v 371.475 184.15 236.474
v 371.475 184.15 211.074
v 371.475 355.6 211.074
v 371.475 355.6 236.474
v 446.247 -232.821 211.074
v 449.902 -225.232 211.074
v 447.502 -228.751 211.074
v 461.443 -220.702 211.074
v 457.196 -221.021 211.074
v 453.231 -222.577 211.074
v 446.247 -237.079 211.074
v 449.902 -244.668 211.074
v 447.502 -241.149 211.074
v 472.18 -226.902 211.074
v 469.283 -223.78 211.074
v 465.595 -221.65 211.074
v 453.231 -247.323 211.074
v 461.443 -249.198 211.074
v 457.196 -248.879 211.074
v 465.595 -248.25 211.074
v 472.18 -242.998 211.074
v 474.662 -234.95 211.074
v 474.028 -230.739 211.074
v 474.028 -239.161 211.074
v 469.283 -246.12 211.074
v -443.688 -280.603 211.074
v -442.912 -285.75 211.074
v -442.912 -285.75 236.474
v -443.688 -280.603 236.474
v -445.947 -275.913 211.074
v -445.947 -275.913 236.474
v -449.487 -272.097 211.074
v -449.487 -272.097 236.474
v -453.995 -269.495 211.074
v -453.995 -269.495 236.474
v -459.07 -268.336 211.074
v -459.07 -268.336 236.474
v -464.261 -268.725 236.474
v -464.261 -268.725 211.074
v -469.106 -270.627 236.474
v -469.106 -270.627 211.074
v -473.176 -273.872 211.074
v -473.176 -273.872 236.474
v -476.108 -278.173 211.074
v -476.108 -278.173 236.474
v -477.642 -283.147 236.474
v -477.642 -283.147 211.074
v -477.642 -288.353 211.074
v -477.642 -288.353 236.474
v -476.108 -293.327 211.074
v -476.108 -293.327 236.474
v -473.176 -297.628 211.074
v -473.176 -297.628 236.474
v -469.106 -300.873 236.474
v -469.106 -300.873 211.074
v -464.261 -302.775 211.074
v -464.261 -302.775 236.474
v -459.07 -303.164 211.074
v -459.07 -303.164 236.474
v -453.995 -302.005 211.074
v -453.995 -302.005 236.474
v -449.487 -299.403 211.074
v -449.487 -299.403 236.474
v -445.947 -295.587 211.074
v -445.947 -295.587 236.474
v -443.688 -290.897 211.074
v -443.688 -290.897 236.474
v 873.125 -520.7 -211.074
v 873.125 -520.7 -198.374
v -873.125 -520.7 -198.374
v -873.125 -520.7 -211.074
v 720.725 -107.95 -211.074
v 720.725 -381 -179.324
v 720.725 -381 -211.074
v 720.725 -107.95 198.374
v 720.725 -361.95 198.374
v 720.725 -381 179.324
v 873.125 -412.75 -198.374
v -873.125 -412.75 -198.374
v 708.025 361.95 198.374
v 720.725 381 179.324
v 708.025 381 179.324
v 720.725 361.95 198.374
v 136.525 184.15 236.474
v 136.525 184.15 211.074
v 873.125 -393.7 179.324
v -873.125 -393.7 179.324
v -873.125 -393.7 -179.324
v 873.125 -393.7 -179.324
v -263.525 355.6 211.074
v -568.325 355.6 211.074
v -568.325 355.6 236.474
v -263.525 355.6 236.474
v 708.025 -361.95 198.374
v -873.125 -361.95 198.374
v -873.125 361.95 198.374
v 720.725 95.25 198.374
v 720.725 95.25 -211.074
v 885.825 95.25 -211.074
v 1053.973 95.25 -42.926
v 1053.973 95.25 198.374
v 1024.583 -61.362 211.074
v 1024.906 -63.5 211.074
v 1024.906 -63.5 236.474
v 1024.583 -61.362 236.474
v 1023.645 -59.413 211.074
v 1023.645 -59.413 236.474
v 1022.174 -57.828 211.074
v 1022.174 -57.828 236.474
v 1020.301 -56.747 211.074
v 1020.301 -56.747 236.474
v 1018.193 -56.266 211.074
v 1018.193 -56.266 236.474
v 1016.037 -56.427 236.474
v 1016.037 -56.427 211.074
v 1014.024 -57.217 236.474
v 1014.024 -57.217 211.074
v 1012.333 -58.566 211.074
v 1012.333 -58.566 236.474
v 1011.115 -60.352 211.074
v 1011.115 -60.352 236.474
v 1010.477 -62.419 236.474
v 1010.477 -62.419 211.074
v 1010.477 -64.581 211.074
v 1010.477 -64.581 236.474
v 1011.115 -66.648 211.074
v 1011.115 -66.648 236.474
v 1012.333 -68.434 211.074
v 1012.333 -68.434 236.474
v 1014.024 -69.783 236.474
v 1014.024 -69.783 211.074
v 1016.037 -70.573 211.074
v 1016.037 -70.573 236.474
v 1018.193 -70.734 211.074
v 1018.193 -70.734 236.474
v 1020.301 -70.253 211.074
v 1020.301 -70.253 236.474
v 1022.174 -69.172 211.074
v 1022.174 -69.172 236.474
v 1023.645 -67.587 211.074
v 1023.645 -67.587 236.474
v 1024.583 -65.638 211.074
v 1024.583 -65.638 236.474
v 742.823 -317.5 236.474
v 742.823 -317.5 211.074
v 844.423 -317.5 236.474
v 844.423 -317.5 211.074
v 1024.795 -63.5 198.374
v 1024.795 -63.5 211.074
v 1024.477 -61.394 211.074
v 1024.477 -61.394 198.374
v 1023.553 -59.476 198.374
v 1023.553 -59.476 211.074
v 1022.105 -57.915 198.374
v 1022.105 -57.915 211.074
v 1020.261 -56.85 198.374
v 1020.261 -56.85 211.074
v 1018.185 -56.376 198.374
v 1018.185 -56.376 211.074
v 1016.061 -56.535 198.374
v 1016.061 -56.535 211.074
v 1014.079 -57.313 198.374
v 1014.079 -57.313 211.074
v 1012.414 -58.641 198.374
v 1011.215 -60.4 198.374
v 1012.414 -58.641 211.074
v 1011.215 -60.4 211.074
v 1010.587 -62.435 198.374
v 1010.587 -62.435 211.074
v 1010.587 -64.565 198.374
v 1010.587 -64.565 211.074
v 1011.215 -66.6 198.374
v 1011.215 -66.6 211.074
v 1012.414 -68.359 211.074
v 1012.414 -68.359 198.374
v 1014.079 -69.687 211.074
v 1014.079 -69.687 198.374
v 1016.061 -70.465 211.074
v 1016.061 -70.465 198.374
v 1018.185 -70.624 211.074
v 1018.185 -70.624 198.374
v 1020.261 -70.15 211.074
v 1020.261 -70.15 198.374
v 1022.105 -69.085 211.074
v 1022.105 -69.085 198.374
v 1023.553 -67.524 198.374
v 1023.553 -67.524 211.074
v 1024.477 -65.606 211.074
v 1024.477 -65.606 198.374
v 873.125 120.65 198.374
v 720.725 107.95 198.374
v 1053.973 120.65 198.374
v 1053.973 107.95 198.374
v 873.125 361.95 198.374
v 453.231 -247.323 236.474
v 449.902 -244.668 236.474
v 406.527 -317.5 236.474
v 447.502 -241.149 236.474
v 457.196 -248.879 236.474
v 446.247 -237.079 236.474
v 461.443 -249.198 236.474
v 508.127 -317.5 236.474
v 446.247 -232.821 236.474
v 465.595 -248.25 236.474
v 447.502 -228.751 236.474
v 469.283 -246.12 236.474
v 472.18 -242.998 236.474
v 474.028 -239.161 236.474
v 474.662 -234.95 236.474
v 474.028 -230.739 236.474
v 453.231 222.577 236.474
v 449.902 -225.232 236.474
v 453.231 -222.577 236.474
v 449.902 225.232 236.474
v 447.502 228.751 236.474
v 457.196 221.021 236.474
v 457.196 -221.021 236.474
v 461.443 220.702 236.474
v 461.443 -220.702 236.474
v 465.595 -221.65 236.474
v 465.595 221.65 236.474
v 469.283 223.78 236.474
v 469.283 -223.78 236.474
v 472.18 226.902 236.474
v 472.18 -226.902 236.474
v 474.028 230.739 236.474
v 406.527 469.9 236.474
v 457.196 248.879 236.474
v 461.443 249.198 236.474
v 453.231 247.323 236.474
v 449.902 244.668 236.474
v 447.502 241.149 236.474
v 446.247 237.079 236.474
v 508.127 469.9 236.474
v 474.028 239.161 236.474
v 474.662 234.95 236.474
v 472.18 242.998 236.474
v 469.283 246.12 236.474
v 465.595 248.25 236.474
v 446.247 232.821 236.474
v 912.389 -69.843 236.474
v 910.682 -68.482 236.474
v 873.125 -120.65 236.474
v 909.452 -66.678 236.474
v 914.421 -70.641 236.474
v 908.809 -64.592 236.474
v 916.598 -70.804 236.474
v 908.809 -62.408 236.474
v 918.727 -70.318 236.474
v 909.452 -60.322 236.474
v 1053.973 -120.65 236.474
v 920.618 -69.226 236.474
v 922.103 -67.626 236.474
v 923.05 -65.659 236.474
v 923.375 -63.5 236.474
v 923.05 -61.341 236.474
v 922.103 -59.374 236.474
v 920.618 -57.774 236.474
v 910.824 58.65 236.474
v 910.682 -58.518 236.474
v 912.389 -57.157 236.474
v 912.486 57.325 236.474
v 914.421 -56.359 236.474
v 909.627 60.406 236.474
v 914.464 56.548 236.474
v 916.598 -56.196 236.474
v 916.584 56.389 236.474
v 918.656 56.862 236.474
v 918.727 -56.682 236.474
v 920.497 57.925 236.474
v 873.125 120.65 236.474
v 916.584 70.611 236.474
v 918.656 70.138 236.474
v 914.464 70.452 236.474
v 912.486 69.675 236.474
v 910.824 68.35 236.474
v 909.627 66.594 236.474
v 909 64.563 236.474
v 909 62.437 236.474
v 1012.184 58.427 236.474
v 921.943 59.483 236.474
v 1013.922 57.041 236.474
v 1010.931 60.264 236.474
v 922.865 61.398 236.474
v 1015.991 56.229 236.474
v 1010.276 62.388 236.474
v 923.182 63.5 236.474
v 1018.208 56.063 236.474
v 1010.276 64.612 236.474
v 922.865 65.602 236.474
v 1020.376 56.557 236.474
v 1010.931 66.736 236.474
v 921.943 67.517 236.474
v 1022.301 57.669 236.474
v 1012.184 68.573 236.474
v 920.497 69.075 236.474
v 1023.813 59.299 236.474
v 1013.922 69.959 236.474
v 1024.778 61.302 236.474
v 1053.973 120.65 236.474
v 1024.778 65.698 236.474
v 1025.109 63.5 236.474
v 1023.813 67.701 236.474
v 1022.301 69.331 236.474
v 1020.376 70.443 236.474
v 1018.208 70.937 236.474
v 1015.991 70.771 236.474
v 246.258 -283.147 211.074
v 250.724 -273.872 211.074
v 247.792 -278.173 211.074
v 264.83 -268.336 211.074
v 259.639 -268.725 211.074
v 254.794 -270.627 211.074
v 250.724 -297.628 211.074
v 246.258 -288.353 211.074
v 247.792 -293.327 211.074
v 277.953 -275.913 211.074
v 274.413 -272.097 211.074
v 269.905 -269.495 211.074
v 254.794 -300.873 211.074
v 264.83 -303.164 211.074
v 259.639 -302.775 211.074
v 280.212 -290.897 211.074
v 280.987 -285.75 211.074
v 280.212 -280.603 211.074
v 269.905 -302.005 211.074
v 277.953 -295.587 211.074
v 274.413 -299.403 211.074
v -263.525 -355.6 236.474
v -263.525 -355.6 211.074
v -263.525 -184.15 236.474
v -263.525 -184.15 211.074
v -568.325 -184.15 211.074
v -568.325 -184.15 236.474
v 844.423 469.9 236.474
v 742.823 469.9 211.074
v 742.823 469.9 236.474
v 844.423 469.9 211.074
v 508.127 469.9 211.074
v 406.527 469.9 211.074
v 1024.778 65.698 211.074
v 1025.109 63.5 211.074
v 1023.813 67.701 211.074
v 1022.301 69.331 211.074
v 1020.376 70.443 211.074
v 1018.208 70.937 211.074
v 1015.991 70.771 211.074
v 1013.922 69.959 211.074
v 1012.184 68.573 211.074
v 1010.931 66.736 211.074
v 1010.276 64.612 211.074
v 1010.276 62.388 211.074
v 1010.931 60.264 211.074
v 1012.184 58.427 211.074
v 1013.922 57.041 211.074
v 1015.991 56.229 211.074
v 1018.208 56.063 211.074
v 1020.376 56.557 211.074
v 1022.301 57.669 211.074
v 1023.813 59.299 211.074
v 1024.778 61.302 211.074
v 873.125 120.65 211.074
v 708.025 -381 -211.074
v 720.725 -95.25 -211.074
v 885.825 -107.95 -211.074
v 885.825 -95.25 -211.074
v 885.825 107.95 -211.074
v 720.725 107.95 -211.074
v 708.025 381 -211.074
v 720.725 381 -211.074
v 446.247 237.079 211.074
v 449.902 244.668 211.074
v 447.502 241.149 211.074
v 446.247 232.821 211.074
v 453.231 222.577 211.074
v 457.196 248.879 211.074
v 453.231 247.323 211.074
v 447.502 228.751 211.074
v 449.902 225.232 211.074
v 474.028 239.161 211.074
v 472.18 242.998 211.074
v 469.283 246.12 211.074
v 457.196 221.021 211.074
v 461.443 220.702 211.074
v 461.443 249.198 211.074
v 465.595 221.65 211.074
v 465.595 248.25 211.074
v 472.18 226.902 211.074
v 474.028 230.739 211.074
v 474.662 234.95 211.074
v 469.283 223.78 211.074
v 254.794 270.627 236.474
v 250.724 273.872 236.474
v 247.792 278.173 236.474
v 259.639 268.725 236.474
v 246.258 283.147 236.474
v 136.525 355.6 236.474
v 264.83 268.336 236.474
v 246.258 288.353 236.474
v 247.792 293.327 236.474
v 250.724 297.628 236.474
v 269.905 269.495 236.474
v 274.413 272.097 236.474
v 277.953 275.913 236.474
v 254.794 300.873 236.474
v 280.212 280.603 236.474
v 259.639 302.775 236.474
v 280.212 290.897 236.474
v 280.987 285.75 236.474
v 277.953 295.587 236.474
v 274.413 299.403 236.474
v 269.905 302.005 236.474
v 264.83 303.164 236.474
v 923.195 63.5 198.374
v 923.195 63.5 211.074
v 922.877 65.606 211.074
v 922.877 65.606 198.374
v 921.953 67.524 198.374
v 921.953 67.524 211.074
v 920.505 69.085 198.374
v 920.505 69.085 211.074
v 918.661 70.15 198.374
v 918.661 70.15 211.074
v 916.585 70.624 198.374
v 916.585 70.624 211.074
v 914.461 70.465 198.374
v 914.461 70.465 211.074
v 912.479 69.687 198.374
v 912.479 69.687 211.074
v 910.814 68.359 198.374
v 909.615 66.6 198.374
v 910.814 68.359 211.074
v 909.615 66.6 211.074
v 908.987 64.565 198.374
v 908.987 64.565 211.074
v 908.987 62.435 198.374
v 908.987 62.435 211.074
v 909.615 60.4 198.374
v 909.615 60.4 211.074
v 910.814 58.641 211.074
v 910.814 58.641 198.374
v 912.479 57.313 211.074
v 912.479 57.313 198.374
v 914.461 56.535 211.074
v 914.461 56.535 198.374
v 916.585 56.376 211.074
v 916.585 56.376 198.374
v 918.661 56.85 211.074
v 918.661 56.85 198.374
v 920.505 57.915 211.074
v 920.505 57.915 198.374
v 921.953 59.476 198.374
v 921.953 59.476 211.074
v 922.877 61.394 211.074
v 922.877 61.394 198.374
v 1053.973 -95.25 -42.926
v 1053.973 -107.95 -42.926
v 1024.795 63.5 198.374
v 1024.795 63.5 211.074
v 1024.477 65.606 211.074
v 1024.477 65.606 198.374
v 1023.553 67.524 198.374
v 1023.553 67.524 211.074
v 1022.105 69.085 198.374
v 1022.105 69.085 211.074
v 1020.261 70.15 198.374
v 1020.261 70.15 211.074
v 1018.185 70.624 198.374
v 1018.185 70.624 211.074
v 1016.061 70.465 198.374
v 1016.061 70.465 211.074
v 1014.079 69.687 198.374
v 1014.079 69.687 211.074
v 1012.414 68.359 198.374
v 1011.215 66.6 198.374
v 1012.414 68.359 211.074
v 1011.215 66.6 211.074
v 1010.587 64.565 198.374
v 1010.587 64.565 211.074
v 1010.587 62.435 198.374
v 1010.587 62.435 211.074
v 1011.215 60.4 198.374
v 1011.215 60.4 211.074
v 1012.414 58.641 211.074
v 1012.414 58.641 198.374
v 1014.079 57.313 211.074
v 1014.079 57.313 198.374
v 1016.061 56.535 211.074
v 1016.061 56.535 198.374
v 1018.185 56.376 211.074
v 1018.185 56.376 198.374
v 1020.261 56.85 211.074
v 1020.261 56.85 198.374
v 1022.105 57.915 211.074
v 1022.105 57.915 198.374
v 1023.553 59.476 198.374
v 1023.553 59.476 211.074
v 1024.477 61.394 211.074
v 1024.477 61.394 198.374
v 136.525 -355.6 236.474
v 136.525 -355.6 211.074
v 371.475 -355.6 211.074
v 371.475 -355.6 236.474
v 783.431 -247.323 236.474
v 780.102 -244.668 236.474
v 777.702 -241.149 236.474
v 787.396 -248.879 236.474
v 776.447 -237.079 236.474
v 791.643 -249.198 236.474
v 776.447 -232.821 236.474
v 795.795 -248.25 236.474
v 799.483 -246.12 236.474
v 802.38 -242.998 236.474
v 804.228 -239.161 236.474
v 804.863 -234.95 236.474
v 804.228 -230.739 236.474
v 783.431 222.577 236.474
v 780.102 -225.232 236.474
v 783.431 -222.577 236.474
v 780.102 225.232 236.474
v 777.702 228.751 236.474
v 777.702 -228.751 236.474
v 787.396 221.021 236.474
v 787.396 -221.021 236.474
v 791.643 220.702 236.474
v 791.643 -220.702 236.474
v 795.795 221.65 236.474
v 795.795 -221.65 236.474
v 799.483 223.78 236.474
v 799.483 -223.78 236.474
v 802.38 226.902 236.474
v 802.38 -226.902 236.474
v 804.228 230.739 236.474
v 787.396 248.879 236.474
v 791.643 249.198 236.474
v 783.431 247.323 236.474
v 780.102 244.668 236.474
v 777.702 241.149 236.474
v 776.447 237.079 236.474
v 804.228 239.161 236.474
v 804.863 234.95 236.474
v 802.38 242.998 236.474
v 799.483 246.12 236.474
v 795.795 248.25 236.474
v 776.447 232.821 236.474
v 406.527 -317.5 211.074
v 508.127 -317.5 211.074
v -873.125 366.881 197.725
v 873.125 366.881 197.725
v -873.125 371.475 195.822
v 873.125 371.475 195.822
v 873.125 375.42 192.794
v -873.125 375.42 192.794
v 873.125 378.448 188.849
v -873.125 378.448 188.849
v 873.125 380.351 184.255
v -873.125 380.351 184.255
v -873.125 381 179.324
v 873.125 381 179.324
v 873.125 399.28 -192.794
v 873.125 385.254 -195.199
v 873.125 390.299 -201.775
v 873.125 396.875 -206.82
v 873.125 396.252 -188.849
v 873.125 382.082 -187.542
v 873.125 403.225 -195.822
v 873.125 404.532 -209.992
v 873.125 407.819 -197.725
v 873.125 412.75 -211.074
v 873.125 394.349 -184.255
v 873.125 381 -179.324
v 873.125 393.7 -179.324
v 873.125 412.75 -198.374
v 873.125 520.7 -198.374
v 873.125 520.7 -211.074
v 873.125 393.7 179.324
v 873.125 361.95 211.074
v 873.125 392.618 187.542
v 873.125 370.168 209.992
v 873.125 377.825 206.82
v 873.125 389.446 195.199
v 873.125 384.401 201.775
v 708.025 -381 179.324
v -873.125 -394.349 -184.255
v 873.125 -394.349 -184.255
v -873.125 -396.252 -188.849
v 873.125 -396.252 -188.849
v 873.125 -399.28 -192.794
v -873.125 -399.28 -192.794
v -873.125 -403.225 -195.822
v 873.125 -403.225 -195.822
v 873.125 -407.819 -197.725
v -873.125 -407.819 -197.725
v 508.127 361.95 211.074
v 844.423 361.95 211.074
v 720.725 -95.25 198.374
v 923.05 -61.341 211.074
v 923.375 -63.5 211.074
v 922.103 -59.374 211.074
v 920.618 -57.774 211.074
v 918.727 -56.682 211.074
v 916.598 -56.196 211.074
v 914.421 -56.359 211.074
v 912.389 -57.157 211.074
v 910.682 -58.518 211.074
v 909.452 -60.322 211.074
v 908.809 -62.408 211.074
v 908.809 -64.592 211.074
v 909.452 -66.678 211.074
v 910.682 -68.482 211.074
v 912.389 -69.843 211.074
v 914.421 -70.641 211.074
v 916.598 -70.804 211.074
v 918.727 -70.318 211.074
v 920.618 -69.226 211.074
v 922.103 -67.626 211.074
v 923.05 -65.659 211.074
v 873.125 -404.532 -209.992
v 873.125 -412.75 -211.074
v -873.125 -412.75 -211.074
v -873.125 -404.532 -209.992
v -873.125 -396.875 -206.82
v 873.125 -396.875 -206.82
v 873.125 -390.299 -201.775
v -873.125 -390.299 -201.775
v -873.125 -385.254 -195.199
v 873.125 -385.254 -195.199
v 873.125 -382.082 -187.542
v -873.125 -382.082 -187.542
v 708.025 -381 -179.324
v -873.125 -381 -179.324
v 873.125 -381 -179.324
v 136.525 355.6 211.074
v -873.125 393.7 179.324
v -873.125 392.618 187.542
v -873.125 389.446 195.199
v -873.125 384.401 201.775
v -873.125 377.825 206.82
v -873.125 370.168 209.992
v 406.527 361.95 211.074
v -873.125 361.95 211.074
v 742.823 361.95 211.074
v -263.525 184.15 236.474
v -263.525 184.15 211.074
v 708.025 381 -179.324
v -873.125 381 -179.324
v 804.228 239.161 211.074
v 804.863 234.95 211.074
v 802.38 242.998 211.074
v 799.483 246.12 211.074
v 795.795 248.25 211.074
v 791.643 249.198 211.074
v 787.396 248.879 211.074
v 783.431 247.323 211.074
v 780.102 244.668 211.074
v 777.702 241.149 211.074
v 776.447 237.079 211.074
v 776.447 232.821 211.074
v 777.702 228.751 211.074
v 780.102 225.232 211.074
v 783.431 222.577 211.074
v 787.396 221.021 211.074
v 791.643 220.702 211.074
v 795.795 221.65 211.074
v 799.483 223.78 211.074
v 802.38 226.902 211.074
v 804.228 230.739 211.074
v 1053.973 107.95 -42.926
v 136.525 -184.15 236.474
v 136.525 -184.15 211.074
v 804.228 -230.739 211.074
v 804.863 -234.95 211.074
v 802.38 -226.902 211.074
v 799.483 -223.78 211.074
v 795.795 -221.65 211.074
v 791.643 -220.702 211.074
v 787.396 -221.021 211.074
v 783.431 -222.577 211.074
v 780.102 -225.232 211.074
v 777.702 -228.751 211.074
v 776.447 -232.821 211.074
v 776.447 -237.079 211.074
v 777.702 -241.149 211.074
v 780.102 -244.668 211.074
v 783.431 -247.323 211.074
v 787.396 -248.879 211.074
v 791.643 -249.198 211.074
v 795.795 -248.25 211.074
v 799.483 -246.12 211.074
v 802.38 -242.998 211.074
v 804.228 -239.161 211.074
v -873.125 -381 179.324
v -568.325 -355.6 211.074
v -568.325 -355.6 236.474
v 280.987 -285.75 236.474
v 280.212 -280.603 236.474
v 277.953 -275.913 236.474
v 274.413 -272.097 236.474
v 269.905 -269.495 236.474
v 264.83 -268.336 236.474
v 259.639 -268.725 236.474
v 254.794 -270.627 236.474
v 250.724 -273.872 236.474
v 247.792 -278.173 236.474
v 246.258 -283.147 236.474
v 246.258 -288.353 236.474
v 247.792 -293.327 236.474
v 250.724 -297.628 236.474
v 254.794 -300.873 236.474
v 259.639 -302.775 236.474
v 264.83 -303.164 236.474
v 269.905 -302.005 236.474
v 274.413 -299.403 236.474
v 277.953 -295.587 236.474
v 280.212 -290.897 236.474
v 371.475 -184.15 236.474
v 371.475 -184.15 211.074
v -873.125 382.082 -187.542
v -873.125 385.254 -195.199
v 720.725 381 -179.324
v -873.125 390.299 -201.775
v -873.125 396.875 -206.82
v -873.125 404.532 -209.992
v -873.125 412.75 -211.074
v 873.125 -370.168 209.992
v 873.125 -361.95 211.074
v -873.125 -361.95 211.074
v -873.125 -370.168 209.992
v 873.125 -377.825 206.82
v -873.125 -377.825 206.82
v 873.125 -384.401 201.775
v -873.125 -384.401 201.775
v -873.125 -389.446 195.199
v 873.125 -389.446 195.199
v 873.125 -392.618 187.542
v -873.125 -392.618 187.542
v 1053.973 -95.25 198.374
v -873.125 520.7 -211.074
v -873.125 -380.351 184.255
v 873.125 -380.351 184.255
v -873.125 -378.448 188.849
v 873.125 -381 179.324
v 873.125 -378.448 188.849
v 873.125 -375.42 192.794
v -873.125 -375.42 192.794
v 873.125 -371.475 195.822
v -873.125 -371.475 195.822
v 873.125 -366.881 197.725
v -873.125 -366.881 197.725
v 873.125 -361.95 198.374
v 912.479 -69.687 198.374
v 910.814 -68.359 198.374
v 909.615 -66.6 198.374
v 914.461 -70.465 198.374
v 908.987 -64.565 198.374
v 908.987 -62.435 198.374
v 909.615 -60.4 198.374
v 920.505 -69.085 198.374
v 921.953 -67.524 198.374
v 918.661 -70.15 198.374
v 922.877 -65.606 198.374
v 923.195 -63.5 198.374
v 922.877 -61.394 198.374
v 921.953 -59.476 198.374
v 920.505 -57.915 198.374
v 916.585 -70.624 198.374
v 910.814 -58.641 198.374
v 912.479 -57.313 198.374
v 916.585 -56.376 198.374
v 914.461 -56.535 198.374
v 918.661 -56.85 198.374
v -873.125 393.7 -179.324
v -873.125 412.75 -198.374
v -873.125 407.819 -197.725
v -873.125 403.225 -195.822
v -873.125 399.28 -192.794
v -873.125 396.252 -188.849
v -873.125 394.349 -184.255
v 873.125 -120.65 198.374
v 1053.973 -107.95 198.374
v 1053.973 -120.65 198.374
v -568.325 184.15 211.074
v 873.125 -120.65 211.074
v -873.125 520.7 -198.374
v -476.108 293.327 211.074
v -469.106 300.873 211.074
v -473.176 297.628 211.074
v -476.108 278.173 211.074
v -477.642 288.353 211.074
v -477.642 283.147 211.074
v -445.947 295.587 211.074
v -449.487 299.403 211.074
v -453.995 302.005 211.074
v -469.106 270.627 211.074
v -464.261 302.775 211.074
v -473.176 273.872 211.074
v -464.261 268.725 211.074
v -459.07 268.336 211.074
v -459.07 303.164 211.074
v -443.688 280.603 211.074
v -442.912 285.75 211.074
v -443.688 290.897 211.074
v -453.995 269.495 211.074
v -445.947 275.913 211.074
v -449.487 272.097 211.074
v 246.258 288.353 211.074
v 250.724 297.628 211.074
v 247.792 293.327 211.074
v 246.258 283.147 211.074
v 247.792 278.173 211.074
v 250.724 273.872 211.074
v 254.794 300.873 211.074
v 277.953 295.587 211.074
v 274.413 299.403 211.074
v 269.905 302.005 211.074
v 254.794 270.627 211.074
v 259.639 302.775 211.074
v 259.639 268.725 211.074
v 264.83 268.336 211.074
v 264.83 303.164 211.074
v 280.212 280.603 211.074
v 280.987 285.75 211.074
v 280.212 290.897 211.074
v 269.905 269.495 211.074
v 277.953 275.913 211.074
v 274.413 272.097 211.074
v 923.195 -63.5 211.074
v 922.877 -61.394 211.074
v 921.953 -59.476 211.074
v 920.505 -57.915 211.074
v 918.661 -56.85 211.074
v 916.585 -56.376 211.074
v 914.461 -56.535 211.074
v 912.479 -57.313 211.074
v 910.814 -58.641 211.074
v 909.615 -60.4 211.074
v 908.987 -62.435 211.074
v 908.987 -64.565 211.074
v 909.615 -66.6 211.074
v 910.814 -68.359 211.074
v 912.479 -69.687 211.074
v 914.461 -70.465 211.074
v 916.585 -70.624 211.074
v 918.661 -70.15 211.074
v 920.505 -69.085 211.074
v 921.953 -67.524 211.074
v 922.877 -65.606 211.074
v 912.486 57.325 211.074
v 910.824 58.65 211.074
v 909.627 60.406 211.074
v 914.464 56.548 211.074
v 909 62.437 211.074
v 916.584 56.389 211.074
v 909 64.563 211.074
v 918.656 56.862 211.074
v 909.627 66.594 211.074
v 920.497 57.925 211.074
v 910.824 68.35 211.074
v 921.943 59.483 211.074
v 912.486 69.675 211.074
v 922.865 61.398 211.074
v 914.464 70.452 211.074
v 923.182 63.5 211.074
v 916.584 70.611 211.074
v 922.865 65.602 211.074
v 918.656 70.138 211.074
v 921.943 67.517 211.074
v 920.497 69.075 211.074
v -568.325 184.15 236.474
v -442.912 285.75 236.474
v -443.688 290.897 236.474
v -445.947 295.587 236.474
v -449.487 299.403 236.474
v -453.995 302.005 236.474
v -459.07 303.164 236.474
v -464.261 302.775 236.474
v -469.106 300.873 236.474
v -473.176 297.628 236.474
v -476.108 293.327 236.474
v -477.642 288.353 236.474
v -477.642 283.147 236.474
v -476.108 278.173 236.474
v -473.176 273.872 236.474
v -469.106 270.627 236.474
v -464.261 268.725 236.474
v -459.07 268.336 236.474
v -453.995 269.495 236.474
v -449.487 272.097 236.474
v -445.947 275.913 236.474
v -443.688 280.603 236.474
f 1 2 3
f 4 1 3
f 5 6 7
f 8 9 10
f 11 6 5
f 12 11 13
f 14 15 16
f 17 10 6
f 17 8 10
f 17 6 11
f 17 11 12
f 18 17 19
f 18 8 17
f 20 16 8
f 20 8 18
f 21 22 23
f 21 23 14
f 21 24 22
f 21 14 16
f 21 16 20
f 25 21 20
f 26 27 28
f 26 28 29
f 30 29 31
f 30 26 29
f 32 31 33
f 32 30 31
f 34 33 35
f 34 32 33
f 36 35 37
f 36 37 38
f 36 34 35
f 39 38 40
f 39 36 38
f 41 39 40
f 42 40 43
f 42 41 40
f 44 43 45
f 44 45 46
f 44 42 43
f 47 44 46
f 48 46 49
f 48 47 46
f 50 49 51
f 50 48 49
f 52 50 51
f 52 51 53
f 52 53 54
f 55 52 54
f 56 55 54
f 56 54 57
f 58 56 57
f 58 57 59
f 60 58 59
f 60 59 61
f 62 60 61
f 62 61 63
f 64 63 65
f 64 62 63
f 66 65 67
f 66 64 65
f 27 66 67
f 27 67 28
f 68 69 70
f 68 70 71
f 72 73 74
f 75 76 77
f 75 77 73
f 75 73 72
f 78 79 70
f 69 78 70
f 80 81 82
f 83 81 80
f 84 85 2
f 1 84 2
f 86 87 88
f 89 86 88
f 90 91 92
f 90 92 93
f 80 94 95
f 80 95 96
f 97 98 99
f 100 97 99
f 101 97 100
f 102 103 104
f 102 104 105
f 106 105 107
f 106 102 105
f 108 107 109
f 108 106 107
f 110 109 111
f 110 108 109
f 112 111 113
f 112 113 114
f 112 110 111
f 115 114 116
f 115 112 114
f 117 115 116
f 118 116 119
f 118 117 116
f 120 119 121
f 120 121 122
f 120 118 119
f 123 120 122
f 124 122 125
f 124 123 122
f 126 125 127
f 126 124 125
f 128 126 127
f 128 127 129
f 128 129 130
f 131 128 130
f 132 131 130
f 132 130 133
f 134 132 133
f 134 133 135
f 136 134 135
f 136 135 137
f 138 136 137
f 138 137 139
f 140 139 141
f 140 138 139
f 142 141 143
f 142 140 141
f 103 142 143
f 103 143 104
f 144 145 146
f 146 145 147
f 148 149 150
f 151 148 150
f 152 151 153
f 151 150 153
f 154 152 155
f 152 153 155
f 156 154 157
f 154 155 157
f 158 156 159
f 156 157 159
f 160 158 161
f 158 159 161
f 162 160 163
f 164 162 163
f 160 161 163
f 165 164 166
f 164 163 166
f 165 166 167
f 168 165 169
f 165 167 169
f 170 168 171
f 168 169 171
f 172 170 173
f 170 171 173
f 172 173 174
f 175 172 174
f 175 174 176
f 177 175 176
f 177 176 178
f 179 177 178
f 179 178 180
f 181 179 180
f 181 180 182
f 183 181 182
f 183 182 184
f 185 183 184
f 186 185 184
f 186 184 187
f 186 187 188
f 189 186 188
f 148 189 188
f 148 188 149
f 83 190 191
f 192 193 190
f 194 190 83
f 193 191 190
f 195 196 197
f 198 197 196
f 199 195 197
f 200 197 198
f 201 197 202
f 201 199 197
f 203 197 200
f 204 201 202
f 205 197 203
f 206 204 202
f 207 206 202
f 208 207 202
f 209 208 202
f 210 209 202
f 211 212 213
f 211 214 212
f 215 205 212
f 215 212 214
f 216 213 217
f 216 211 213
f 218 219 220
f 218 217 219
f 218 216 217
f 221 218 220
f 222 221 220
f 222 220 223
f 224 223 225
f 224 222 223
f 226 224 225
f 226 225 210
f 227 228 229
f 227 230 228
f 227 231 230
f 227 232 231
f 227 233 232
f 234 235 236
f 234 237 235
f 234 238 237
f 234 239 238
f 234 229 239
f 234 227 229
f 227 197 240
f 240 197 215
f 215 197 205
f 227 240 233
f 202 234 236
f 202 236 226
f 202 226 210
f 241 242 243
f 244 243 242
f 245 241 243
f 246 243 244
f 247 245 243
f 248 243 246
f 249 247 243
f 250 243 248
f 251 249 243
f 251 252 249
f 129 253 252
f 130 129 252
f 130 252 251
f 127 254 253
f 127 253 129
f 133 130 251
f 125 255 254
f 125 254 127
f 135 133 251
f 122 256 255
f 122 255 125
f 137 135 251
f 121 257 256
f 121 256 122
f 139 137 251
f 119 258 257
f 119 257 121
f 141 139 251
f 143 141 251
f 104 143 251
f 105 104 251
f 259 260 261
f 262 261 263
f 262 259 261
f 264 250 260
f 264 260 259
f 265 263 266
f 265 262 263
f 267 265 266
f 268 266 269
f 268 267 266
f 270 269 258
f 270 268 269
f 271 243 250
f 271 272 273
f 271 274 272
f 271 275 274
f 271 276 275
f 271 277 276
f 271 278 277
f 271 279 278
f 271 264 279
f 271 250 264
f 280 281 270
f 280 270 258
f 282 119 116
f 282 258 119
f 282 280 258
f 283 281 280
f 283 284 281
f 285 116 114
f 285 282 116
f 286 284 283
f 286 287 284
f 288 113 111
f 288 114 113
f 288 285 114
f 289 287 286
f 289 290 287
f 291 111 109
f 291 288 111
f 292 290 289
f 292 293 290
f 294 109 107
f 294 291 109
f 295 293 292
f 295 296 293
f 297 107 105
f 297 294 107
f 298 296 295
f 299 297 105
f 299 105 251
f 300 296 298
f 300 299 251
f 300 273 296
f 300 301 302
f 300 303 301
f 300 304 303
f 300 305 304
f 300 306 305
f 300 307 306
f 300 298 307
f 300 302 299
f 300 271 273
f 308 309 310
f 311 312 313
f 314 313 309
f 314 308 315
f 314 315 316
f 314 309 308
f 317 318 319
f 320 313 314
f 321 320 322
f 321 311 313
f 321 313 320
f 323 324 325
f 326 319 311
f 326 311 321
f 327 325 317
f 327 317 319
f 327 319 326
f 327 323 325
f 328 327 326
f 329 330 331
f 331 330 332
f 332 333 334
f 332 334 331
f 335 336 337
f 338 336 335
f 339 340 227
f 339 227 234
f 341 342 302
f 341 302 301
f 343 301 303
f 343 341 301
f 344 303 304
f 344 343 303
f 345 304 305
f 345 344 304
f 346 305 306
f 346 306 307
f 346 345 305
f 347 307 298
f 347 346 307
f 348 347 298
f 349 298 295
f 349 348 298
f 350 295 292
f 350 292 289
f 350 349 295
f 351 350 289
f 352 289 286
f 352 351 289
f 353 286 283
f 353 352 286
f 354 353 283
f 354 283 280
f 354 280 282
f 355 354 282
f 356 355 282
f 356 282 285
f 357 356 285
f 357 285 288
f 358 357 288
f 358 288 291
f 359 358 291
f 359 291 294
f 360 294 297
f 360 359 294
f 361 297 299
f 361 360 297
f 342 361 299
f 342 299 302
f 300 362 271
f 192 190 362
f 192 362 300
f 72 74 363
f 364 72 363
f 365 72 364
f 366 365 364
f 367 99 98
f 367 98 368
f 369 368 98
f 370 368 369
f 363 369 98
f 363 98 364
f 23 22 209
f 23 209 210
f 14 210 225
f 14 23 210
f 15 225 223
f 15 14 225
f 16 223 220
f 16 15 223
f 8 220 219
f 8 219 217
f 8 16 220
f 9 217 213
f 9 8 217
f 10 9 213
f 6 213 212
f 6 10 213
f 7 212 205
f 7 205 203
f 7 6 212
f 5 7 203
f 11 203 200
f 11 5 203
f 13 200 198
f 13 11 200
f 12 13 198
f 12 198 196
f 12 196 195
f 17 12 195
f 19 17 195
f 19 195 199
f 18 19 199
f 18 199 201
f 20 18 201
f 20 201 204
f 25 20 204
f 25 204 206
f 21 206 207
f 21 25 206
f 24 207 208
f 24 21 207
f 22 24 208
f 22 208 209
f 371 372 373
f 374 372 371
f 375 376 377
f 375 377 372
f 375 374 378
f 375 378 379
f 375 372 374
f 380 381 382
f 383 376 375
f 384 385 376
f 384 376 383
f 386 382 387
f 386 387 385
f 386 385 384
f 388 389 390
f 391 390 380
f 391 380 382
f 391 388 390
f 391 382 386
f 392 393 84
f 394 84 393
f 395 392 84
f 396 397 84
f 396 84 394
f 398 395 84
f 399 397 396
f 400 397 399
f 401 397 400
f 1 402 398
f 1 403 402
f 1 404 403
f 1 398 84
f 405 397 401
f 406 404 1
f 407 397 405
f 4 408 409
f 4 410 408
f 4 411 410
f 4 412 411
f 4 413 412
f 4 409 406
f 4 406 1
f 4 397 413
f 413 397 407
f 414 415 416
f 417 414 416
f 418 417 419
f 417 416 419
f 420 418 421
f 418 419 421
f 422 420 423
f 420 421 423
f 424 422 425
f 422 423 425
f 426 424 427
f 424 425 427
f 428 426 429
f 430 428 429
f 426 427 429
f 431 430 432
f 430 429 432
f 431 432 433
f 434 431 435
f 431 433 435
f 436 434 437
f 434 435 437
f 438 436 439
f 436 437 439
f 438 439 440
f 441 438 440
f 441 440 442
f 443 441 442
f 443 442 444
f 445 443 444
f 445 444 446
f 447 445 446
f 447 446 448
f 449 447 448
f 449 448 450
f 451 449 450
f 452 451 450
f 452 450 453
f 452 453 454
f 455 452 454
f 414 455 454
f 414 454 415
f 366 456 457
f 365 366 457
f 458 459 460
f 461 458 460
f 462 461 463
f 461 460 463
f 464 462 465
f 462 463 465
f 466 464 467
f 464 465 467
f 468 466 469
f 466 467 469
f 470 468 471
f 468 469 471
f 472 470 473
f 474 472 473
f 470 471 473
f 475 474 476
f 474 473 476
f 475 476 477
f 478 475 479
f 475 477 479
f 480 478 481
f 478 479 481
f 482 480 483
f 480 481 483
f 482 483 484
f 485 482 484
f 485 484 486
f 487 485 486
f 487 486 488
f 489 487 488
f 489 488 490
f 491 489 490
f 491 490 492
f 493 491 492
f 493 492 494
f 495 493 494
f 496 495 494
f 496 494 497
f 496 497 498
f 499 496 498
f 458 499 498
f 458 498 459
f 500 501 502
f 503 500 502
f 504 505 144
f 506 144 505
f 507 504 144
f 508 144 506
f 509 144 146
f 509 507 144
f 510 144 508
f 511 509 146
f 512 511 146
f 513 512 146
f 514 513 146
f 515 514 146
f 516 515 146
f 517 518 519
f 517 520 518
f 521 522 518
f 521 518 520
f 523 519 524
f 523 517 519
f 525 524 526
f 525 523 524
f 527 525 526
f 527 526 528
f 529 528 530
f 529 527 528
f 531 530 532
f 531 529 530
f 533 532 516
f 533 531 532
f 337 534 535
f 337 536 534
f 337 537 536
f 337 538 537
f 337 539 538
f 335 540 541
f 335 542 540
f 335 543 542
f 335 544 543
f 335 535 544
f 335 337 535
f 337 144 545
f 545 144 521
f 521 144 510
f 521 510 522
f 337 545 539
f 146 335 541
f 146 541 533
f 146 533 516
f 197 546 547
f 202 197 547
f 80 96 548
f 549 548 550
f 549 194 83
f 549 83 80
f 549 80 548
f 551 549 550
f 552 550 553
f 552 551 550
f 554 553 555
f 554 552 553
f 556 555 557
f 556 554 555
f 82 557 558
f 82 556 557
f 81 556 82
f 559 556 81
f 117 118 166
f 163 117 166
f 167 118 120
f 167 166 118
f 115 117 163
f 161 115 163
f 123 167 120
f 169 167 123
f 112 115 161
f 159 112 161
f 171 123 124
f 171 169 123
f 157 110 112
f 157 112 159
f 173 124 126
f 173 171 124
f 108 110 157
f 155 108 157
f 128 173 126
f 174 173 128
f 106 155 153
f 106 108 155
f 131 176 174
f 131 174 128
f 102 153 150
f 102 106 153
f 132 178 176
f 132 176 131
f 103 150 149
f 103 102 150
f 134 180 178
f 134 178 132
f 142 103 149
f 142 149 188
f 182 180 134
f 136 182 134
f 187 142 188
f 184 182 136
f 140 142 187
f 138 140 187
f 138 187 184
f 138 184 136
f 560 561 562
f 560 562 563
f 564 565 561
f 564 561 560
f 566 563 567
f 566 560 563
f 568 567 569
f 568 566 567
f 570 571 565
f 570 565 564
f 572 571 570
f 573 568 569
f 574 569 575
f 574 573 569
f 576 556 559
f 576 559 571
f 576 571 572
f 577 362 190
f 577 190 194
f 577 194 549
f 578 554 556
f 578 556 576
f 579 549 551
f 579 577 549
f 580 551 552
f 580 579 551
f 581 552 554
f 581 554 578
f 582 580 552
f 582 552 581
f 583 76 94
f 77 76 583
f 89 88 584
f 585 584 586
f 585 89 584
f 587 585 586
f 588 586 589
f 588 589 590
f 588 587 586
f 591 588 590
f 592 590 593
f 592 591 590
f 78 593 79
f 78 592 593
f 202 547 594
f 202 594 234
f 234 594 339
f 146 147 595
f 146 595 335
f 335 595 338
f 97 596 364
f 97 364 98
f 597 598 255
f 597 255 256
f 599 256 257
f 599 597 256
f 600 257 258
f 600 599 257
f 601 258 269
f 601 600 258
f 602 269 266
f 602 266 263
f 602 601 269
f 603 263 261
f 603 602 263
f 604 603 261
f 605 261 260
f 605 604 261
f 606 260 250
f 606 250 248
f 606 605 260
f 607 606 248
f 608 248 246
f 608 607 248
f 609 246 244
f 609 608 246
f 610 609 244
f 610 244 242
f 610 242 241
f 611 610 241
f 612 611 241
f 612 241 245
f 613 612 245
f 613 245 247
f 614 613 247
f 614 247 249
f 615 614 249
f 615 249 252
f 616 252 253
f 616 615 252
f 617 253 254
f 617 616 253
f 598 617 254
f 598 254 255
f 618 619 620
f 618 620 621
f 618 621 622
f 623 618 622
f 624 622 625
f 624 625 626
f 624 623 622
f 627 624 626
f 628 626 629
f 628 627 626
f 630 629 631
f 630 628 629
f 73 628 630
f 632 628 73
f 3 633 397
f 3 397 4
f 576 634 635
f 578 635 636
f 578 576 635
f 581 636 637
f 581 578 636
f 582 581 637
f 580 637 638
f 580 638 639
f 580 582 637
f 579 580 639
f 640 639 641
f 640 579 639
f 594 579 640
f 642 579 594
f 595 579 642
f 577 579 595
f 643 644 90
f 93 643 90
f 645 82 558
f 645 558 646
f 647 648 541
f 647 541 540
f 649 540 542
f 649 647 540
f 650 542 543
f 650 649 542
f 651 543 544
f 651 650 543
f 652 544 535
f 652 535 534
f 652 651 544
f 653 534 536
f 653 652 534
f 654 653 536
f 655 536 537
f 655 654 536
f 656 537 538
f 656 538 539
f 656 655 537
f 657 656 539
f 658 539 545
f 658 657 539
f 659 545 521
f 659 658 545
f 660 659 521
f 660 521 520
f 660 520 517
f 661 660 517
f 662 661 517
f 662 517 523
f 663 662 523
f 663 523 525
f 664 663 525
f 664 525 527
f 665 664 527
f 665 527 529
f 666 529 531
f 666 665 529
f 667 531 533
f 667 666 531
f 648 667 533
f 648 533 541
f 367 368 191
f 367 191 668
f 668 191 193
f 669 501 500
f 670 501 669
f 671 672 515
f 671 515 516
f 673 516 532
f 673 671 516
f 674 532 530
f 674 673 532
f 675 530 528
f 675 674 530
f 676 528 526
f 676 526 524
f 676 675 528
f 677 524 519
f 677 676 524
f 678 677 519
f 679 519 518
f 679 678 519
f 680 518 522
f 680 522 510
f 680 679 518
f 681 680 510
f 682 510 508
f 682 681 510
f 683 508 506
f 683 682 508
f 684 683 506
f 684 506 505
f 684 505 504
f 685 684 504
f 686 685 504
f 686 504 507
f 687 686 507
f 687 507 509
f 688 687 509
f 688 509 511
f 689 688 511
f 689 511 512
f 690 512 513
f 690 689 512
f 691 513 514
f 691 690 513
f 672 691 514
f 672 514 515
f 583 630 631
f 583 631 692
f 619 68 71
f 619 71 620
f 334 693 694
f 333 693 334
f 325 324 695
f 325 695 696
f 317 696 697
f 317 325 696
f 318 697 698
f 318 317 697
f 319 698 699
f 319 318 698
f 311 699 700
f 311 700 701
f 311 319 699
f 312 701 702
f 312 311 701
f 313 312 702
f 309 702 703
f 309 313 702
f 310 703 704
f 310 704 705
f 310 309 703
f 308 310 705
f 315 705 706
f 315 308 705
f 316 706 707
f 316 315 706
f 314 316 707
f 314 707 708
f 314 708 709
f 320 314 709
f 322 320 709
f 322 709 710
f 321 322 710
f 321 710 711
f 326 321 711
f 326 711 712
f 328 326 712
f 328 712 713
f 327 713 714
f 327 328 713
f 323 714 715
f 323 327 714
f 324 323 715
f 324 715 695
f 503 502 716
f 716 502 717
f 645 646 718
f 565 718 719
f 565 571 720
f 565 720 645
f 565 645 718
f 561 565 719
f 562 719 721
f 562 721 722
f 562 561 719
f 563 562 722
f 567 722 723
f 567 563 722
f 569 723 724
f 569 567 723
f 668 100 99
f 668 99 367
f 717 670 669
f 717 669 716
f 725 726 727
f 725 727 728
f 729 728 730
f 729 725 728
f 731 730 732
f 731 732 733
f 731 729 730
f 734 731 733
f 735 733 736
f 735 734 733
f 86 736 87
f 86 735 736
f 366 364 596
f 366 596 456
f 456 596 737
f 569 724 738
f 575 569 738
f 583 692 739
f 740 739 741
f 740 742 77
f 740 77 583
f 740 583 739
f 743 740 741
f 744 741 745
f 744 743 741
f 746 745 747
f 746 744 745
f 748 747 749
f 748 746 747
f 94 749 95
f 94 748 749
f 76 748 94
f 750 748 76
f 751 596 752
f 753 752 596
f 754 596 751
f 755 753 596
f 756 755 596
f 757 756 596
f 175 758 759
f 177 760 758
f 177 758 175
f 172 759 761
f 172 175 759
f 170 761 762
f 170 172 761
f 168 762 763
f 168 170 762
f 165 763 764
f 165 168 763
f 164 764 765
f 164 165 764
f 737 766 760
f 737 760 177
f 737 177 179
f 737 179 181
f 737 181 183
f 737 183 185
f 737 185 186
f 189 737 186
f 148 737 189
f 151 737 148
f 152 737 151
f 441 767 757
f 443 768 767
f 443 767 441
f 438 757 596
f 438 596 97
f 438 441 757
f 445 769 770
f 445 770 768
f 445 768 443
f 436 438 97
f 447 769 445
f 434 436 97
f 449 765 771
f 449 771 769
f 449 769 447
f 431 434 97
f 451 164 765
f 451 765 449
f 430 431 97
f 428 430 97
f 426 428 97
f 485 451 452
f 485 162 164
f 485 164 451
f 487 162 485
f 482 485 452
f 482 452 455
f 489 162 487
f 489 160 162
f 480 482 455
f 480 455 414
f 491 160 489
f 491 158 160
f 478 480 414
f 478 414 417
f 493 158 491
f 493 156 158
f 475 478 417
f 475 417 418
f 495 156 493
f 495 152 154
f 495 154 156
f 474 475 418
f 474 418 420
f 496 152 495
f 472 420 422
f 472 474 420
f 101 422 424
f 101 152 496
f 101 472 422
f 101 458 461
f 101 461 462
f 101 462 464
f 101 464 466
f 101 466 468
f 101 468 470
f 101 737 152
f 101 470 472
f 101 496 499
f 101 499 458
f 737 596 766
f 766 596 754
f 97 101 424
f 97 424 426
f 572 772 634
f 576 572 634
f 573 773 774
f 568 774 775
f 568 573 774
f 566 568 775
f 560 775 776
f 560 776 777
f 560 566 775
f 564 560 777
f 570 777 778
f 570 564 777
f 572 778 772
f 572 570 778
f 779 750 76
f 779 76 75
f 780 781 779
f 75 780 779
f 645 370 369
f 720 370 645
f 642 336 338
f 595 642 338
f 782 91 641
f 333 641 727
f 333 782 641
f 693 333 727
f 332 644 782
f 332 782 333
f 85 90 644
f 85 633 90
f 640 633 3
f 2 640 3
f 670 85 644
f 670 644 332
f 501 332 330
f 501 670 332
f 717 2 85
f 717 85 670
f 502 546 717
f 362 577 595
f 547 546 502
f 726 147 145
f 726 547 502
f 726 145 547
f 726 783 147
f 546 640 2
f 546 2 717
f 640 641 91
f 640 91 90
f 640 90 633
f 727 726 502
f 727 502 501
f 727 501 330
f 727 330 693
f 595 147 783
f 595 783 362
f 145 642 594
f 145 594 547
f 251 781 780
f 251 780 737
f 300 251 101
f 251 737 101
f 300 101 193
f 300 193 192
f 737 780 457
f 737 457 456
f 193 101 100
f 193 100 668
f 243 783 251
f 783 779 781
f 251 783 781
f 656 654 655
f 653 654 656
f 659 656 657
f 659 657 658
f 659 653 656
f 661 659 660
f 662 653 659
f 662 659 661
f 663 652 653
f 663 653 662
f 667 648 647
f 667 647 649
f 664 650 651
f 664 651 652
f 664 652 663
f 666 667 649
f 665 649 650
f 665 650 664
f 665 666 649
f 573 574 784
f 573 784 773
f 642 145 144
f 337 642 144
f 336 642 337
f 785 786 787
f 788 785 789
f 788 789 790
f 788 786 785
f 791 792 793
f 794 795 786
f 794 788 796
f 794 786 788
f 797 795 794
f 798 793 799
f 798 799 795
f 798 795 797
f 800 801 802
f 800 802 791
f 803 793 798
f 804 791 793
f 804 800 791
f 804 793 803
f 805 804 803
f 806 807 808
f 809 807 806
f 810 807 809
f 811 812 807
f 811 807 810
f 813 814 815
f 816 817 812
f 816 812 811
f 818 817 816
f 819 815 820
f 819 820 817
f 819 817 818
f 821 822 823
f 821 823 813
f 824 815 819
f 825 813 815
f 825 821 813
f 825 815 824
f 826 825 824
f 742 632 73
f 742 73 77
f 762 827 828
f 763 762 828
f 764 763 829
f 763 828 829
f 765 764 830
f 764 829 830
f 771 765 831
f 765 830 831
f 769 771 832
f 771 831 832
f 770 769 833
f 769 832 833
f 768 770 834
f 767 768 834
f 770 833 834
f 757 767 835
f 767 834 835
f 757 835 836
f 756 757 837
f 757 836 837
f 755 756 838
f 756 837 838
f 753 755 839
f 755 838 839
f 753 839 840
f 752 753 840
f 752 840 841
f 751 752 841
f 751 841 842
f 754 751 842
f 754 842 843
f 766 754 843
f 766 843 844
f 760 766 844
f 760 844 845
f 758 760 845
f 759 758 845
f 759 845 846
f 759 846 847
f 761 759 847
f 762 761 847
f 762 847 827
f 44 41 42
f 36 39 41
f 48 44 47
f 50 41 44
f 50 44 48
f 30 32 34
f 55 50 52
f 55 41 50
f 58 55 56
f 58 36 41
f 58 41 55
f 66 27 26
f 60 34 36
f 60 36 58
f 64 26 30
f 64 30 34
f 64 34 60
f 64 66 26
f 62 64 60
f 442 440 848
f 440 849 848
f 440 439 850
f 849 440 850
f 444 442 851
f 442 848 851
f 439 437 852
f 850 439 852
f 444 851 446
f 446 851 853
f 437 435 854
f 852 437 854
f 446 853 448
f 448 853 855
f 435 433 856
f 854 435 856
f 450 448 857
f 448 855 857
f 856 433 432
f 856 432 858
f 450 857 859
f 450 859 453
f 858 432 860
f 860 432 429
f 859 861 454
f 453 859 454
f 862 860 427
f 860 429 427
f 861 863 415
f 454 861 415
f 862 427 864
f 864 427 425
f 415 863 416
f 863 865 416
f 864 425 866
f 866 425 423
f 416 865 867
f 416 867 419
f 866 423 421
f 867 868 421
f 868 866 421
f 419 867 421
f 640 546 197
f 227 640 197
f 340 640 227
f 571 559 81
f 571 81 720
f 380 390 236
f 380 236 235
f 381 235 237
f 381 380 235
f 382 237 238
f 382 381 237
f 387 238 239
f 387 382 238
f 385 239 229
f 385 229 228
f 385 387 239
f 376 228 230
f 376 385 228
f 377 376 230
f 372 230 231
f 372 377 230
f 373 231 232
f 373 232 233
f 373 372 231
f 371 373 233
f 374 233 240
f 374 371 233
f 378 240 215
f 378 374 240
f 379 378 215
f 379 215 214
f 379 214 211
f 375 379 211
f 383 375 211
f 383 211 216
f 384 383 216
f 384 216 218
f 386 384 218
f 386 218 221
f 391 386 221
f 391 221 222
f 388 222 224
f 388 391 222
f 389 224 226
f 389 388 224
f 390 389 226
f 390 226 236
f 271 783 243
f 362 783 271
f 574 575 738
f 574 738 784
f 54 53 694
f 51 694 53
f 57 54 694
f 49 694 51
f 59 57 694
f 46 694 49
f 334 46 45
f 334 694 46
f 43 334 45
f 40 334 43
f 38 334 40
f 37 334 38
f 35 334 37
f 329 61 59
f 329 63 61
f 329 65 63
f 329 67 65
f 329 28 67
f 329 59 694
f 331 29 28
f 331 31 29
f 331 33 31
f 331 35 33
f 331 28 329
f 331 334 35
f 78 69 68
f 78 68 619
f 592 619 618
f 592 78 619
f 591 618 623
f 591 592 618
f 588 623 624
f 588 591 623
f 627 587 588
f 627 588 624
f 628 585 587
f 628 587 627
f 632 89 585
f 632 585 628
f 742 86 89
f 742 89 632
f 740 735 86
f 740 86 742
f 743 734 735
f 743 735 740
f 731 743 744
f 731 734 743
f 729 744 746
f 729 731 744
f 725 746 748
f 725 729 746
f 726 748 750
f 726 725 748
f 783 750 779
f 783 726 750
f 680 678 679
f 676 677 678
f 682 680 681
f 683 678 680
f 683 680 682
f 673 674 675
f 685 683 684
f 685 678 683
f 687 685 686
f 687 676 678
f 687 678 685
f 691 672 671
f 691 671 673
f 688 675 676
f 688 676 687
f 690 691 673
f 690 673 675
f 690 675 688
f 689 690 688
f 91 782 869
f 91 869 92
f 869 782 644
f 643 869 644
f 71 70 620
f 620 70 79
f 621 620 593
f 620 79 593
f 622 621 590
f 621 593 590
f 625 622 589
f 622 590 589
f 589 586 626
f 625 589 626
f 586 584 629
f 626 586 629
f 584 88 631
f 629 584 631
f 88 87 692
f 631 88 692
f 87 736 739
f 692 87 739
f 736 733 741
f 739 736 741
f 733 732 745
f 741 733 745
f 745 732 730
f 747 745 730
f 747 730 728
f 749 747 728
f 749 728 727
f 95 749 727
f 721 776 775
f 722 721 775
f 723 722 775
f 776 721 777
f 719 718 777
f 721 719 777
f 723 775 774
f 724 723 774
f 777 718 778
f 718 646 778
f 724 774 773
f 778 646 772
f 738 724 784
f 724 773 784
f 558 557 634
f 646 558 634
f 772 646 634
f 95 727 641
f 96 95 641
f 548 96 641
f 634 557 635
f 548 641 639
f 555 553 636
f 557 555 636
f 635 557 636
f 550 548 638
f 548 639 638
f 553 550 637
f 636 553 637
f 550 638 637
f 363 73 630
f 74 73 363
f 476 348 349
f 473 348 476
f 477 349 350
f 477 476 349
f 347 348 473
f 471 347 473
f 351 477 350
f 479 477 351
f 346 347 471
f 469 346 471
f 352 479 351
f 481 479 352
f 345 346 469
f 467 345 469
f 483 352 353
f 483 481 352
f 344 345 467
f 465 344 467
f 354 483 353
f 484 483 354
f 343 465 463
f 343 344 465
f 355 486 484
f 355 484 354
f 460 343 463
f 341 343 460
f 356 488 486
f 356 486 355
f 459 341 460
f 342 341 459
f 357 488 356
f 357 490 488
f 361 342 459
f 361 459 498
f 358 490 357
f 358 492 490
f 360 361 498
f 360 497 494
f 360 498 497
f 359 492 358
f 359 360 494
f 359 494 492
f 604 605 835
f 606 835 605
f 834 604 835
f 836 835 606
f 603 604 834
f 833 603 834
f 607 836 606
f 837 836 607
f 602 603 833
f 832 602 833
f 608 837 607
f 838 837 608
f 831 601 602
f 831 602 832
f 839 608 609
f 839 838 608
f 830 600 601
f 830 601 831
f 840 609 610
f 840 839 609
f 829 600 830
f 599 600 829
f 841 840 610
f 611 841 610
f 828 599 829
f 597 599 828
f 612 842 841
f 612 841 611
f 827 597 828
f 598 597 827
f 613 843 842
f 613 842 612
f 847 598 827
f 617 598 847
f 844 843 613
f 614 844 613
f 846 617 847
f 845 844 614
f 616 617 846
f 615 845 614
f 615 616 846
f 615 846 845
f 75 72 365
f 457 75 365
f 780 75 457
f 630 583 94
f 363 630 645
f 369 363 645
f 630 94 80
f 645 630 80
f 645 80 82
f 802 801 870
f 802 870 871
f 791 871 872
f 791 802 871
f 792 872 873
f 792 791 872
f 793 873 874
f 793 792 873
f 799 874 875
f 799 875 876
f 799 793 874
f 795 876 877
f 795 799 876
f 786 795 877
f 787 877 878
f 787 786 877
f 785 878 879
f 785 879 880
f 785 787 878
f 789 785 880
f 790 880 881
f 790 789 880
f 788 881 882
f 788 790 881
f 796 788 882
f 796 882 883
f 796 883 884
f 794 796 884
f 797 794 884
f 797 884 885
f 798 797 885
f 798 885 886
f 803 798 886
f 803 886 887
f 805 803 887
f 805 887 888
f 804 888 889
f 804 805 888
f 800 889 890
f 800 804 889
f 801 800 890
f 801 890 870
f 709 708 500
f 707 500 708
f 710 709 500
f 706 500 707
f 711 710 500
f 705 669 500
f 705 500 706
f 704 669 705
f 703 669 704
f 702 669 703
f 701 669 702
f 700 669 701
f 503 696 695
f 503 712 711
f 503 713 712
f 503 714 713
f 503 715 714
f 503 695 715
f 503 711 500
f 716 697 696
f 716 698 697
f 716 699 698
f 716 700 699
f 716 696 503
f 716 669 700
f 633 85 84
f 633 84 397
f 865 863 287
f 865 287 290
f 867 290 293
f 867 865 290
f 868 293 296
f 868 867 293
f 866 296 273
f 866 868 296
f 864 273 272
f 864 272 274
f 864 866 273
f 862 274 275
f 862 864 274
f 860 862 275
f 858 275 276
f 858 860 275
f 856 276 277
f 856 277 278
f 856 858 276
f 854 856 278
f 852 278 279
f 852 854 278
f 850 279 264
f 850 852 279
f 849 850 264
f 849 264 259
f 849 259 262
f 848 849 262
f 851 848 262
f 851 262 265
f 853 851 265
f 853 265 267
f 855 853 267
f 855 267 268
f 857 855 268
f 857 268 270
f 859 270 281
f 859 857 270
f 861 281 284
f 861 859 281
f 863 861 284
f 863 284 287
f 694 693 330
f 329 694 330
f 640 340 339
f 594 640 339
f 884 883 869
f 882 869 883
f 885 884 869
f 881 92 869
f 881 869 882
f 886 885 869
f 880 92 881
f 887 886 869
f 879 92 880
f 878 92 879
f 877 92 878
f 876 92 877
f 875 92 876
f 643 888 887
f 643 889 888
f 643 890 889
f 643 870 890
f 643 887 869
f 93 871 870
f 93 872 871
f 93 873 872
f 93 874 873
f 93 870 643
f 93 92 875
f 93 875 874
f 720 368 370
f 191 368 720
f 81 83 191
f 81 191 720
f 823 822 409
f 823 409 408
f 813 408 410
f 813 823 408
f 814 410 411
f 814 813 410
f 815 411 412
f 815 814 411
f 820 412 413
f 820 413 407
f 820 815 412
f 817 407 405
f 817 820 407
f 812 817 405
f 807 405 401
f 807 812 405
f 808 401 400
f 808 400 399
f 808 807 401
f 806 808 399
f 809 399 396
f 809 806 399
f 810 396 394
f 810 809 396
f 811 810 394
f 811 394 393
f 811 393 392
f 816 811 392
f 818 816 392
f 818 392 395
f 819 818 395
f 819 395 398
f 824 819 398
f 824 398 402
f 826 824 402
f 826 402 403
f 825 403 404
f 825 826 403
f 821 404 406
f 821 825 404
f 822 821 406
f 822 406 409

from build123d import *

# Parameters (mm, degrees)
F1_DEPTH  = 873.125
F4_DEPTH  = 12.7
F5_W      = 304.8
F5_H      = 171.45
F5_R      = 17.4625
F5_W_2    = 234.95
F6_DEPTH  = 25.4
F7_W      = 101.6
F7_H      = 787.4
F7_R      = 14.2875
F8_DEPTH  = 25.4
F9_W      = 180.848
F9_H      = 241.3
F10_DEPTH = 12.7
F12_W     = 333.248
F12_H     = 409.448
F13_DEPTH = 12.7
F14_SIZE  = 168.148
F16_R     = 7.14375
F17_DEPTH = 422.149
F18_W     = 180.848
F18_H     = 241.3
F18_R     = 7.324206161
F18_R_2   = 7.2547005792
F18_R_3   = 7.130511654
F18_R_4   = 7.4581094532
F19_DEPTH = 25.4


with BuildPart() as f1:
    # F0 (on Right) → F1 (new body, symmetric)
    with BuildSketch(Plane.YZ):
        with BuildLine():
            Line((361.95, 211.074), (-361.95, 211.074))
            ThreePointArc((-361.95, 211.074), (-384.4006403027, 201.7746403027), (-393.7, 179.324))
            Line((-393.7, 179.324), (-393.7, -179.324))
            ThreePointArc((-393.7, -179.324), (-399.2796158184, -192.7943841816), (-412.75, -198.374))
            Line((-412.75, -198.374), (-520.7, -198.374))
            Line((-520.7, -198.374), (-520.7, -211.074))
            Line((-520.7, -211.074), (-412.75, -211.074))
            ThreePointArc((-412.75, -211.074), (-390.2993596973, -201.7746403027), (-381, -179.324))
            Line((-381, -179.324), (-381, 179.324))
            ThreePointArc((-381, 179.324), (-375.4203841816, 192.7943841816), (-361.95, 198.374))
            Line((-361.95, 198.374), (361.95, 198.374))
            ThreePointArc((361.95, 198.374), (375.4203841816, 192.7943841816), (381, 179.324))
            Line((381, 179.324), (381, -179.324))
            ThreePointArc((381, -179.324), (390.2993596973, -201.7746403027), (412.75, -211.074))
            Line((412.75, -211.074), (520.7, -211.074))
            Line((520.7, -211.074), (520.7, -198.374))
            Line((520.7, -198.374), (412.75, -198.374))
            ThreePointArc((412.75, -198.374), (399.2796158184, -192.7943841816), (393.7, -179.324))
            Line((393.7, -179.324), (393.7, 179.324))
            ThreePointArc((393.7, 179.324), (384.4006403027, 201.7746403027), (361.95, 211.074))
        make_face()
    extrude(amount=F1_DEPTH, both=True)

    # F5 (on face) → F6 (join)
    with BuildSketch(Plane.XY.offset(211.074)):
        with Locations((-415.925, -269.875)):
            Rectangle(F5_W, F5_H)
        with Locations((-460.375, -285.75)):
            Circle(F5_R, mode=Mode.SUBTRACT)
        with Locations((254, -269.875)):
            Rectangle(F5_W_2, F5_H)
        with Locations((263.525, -285.75)):
            Circle(F5_R, mode=Mode.SUBTRACT)
        with Locations((-415.925, 269.875)):
            Rectangle(F5_W, F5_H)
        with Locations((-460.375, 285.75)):
            Circle(F5_R, mode=Mode.SUBTRACT)
        with Locations((254, 269.875)):
            Rectangle(F5_W_2, F5_H)
        with Locations((263.525, 285.75)):
            Circle(F5_R, mode=Mode.SUBTRACT)
    extrude(amount=F6_DEPTH)

    # F7 (on face) → F8 (join)
    with BuildSketch(Plane.XY.offset(211.074)):
        with Locations((457.327, 76.2)):
            Rectangle(F7_W, F7_H)
        with Locations((460.375, -234.95)):
            Circle(F7_R, mode=Mode.SUBTRACT)
        with Locations((460.375, 234.95)):
            Circle(F7_R, mode=Mode.SUBTRACT)
        with Locations((793.623, 76.2)):
            Rectangle(F7_W, F7_H)
        with Locations((790.575, -234.95)):
            Circle(F7_R, mode=Mode.SUBTRACT)
        with Locations((790.575, 234.95)):
            Circle(F7_R, mode=Mode.SUBTRACT)
    extrude(amount=F8_DEPTH)

    # F9 (on face) → F10 (join)
    with BuildSketch(Plane.XY.offset(211.074)):
        with Locations((963.549, 0)):
            Rectangle(F9_W, F9_H)
    extrude(amount=-F10_DEPTH)



with BuildPart() as f4:
    # F3 (on offset) → F4 (new body)
    with BuildSketch(Plane.YZ.offset(720.725)):
        Polygon((361.95, 198.374), (-361.95, 198.374), (-381, 179.324), (-381, -211.074), (381, -211.074), (381, 179.324), align=None)
    extrude(amount=-F4_DEPTH)


with BuildPart() as f13:
    # F12 (on offset) → F13 (new body)
    with BuildSketch(Plane.XZ.offset(-95.25)):
        with Locations((887.349, -6.35)):
            Rectangle(F12_W, F12_H)
    extrude(amount=-F13_DEPTH)

    # F14
    f14_edges = [f13.edges().sort_by_distance(p)[0] for p in [
        (1053.973, 101.6, -211.074),
    ]]
    chamfer(f14_edges, length=F14_SIZE)


with BuildPart() as f1_1:
    add(f1.part)

    add(f4.part)  # F15 merges F4
    # F15: F13 across plane
    add(f13.part.mirror(Plane.XZ))

    # F16 (on face) → F17 (cut, through all)
    with BuildSketch(Plane.XY.offset(211.074)):
        with Locations((916.051, 63.5)):
            Circle(F16_R)
        with Locations((1017.651, 63.5)):
            Circle(F16_R)
        with Locations((1017.651, -63.5)):
            Circle(F16_R)
        with Locations((916.051, -63.5)):
            Circle(F16_R)
    extrude(amount=-F17_DEPTH, mode=Mode.SUBTRACT)


    add(f13.part)  # F19 merges F13
    # F18 (on face) → F19 (join)
    with BuildSketch(Plane.XY.offset(211.074)):
        with Locations((963.549, 0)):
            Rectangle(F18_W, F18_H)
        with Locations((916.051, -63.5)):
            Circle(F18_R, mode=Mode.SUBTRACT)
        with Locations((1017.651, -63.5)):
            Circle(F18_R_2, mode=Mode.SUBTRACT)
        with Locations((916.051, 63.5)):
            Circle(F18_R_3, mode=Mode.SUBTRACT)
        with Locations((1017.651, 63.5)):
            Circle(F18_R_4, mode=Mode.SUBTRACT)
    extrude(amount=F19_DEPTH)


solid = f1_1.part
